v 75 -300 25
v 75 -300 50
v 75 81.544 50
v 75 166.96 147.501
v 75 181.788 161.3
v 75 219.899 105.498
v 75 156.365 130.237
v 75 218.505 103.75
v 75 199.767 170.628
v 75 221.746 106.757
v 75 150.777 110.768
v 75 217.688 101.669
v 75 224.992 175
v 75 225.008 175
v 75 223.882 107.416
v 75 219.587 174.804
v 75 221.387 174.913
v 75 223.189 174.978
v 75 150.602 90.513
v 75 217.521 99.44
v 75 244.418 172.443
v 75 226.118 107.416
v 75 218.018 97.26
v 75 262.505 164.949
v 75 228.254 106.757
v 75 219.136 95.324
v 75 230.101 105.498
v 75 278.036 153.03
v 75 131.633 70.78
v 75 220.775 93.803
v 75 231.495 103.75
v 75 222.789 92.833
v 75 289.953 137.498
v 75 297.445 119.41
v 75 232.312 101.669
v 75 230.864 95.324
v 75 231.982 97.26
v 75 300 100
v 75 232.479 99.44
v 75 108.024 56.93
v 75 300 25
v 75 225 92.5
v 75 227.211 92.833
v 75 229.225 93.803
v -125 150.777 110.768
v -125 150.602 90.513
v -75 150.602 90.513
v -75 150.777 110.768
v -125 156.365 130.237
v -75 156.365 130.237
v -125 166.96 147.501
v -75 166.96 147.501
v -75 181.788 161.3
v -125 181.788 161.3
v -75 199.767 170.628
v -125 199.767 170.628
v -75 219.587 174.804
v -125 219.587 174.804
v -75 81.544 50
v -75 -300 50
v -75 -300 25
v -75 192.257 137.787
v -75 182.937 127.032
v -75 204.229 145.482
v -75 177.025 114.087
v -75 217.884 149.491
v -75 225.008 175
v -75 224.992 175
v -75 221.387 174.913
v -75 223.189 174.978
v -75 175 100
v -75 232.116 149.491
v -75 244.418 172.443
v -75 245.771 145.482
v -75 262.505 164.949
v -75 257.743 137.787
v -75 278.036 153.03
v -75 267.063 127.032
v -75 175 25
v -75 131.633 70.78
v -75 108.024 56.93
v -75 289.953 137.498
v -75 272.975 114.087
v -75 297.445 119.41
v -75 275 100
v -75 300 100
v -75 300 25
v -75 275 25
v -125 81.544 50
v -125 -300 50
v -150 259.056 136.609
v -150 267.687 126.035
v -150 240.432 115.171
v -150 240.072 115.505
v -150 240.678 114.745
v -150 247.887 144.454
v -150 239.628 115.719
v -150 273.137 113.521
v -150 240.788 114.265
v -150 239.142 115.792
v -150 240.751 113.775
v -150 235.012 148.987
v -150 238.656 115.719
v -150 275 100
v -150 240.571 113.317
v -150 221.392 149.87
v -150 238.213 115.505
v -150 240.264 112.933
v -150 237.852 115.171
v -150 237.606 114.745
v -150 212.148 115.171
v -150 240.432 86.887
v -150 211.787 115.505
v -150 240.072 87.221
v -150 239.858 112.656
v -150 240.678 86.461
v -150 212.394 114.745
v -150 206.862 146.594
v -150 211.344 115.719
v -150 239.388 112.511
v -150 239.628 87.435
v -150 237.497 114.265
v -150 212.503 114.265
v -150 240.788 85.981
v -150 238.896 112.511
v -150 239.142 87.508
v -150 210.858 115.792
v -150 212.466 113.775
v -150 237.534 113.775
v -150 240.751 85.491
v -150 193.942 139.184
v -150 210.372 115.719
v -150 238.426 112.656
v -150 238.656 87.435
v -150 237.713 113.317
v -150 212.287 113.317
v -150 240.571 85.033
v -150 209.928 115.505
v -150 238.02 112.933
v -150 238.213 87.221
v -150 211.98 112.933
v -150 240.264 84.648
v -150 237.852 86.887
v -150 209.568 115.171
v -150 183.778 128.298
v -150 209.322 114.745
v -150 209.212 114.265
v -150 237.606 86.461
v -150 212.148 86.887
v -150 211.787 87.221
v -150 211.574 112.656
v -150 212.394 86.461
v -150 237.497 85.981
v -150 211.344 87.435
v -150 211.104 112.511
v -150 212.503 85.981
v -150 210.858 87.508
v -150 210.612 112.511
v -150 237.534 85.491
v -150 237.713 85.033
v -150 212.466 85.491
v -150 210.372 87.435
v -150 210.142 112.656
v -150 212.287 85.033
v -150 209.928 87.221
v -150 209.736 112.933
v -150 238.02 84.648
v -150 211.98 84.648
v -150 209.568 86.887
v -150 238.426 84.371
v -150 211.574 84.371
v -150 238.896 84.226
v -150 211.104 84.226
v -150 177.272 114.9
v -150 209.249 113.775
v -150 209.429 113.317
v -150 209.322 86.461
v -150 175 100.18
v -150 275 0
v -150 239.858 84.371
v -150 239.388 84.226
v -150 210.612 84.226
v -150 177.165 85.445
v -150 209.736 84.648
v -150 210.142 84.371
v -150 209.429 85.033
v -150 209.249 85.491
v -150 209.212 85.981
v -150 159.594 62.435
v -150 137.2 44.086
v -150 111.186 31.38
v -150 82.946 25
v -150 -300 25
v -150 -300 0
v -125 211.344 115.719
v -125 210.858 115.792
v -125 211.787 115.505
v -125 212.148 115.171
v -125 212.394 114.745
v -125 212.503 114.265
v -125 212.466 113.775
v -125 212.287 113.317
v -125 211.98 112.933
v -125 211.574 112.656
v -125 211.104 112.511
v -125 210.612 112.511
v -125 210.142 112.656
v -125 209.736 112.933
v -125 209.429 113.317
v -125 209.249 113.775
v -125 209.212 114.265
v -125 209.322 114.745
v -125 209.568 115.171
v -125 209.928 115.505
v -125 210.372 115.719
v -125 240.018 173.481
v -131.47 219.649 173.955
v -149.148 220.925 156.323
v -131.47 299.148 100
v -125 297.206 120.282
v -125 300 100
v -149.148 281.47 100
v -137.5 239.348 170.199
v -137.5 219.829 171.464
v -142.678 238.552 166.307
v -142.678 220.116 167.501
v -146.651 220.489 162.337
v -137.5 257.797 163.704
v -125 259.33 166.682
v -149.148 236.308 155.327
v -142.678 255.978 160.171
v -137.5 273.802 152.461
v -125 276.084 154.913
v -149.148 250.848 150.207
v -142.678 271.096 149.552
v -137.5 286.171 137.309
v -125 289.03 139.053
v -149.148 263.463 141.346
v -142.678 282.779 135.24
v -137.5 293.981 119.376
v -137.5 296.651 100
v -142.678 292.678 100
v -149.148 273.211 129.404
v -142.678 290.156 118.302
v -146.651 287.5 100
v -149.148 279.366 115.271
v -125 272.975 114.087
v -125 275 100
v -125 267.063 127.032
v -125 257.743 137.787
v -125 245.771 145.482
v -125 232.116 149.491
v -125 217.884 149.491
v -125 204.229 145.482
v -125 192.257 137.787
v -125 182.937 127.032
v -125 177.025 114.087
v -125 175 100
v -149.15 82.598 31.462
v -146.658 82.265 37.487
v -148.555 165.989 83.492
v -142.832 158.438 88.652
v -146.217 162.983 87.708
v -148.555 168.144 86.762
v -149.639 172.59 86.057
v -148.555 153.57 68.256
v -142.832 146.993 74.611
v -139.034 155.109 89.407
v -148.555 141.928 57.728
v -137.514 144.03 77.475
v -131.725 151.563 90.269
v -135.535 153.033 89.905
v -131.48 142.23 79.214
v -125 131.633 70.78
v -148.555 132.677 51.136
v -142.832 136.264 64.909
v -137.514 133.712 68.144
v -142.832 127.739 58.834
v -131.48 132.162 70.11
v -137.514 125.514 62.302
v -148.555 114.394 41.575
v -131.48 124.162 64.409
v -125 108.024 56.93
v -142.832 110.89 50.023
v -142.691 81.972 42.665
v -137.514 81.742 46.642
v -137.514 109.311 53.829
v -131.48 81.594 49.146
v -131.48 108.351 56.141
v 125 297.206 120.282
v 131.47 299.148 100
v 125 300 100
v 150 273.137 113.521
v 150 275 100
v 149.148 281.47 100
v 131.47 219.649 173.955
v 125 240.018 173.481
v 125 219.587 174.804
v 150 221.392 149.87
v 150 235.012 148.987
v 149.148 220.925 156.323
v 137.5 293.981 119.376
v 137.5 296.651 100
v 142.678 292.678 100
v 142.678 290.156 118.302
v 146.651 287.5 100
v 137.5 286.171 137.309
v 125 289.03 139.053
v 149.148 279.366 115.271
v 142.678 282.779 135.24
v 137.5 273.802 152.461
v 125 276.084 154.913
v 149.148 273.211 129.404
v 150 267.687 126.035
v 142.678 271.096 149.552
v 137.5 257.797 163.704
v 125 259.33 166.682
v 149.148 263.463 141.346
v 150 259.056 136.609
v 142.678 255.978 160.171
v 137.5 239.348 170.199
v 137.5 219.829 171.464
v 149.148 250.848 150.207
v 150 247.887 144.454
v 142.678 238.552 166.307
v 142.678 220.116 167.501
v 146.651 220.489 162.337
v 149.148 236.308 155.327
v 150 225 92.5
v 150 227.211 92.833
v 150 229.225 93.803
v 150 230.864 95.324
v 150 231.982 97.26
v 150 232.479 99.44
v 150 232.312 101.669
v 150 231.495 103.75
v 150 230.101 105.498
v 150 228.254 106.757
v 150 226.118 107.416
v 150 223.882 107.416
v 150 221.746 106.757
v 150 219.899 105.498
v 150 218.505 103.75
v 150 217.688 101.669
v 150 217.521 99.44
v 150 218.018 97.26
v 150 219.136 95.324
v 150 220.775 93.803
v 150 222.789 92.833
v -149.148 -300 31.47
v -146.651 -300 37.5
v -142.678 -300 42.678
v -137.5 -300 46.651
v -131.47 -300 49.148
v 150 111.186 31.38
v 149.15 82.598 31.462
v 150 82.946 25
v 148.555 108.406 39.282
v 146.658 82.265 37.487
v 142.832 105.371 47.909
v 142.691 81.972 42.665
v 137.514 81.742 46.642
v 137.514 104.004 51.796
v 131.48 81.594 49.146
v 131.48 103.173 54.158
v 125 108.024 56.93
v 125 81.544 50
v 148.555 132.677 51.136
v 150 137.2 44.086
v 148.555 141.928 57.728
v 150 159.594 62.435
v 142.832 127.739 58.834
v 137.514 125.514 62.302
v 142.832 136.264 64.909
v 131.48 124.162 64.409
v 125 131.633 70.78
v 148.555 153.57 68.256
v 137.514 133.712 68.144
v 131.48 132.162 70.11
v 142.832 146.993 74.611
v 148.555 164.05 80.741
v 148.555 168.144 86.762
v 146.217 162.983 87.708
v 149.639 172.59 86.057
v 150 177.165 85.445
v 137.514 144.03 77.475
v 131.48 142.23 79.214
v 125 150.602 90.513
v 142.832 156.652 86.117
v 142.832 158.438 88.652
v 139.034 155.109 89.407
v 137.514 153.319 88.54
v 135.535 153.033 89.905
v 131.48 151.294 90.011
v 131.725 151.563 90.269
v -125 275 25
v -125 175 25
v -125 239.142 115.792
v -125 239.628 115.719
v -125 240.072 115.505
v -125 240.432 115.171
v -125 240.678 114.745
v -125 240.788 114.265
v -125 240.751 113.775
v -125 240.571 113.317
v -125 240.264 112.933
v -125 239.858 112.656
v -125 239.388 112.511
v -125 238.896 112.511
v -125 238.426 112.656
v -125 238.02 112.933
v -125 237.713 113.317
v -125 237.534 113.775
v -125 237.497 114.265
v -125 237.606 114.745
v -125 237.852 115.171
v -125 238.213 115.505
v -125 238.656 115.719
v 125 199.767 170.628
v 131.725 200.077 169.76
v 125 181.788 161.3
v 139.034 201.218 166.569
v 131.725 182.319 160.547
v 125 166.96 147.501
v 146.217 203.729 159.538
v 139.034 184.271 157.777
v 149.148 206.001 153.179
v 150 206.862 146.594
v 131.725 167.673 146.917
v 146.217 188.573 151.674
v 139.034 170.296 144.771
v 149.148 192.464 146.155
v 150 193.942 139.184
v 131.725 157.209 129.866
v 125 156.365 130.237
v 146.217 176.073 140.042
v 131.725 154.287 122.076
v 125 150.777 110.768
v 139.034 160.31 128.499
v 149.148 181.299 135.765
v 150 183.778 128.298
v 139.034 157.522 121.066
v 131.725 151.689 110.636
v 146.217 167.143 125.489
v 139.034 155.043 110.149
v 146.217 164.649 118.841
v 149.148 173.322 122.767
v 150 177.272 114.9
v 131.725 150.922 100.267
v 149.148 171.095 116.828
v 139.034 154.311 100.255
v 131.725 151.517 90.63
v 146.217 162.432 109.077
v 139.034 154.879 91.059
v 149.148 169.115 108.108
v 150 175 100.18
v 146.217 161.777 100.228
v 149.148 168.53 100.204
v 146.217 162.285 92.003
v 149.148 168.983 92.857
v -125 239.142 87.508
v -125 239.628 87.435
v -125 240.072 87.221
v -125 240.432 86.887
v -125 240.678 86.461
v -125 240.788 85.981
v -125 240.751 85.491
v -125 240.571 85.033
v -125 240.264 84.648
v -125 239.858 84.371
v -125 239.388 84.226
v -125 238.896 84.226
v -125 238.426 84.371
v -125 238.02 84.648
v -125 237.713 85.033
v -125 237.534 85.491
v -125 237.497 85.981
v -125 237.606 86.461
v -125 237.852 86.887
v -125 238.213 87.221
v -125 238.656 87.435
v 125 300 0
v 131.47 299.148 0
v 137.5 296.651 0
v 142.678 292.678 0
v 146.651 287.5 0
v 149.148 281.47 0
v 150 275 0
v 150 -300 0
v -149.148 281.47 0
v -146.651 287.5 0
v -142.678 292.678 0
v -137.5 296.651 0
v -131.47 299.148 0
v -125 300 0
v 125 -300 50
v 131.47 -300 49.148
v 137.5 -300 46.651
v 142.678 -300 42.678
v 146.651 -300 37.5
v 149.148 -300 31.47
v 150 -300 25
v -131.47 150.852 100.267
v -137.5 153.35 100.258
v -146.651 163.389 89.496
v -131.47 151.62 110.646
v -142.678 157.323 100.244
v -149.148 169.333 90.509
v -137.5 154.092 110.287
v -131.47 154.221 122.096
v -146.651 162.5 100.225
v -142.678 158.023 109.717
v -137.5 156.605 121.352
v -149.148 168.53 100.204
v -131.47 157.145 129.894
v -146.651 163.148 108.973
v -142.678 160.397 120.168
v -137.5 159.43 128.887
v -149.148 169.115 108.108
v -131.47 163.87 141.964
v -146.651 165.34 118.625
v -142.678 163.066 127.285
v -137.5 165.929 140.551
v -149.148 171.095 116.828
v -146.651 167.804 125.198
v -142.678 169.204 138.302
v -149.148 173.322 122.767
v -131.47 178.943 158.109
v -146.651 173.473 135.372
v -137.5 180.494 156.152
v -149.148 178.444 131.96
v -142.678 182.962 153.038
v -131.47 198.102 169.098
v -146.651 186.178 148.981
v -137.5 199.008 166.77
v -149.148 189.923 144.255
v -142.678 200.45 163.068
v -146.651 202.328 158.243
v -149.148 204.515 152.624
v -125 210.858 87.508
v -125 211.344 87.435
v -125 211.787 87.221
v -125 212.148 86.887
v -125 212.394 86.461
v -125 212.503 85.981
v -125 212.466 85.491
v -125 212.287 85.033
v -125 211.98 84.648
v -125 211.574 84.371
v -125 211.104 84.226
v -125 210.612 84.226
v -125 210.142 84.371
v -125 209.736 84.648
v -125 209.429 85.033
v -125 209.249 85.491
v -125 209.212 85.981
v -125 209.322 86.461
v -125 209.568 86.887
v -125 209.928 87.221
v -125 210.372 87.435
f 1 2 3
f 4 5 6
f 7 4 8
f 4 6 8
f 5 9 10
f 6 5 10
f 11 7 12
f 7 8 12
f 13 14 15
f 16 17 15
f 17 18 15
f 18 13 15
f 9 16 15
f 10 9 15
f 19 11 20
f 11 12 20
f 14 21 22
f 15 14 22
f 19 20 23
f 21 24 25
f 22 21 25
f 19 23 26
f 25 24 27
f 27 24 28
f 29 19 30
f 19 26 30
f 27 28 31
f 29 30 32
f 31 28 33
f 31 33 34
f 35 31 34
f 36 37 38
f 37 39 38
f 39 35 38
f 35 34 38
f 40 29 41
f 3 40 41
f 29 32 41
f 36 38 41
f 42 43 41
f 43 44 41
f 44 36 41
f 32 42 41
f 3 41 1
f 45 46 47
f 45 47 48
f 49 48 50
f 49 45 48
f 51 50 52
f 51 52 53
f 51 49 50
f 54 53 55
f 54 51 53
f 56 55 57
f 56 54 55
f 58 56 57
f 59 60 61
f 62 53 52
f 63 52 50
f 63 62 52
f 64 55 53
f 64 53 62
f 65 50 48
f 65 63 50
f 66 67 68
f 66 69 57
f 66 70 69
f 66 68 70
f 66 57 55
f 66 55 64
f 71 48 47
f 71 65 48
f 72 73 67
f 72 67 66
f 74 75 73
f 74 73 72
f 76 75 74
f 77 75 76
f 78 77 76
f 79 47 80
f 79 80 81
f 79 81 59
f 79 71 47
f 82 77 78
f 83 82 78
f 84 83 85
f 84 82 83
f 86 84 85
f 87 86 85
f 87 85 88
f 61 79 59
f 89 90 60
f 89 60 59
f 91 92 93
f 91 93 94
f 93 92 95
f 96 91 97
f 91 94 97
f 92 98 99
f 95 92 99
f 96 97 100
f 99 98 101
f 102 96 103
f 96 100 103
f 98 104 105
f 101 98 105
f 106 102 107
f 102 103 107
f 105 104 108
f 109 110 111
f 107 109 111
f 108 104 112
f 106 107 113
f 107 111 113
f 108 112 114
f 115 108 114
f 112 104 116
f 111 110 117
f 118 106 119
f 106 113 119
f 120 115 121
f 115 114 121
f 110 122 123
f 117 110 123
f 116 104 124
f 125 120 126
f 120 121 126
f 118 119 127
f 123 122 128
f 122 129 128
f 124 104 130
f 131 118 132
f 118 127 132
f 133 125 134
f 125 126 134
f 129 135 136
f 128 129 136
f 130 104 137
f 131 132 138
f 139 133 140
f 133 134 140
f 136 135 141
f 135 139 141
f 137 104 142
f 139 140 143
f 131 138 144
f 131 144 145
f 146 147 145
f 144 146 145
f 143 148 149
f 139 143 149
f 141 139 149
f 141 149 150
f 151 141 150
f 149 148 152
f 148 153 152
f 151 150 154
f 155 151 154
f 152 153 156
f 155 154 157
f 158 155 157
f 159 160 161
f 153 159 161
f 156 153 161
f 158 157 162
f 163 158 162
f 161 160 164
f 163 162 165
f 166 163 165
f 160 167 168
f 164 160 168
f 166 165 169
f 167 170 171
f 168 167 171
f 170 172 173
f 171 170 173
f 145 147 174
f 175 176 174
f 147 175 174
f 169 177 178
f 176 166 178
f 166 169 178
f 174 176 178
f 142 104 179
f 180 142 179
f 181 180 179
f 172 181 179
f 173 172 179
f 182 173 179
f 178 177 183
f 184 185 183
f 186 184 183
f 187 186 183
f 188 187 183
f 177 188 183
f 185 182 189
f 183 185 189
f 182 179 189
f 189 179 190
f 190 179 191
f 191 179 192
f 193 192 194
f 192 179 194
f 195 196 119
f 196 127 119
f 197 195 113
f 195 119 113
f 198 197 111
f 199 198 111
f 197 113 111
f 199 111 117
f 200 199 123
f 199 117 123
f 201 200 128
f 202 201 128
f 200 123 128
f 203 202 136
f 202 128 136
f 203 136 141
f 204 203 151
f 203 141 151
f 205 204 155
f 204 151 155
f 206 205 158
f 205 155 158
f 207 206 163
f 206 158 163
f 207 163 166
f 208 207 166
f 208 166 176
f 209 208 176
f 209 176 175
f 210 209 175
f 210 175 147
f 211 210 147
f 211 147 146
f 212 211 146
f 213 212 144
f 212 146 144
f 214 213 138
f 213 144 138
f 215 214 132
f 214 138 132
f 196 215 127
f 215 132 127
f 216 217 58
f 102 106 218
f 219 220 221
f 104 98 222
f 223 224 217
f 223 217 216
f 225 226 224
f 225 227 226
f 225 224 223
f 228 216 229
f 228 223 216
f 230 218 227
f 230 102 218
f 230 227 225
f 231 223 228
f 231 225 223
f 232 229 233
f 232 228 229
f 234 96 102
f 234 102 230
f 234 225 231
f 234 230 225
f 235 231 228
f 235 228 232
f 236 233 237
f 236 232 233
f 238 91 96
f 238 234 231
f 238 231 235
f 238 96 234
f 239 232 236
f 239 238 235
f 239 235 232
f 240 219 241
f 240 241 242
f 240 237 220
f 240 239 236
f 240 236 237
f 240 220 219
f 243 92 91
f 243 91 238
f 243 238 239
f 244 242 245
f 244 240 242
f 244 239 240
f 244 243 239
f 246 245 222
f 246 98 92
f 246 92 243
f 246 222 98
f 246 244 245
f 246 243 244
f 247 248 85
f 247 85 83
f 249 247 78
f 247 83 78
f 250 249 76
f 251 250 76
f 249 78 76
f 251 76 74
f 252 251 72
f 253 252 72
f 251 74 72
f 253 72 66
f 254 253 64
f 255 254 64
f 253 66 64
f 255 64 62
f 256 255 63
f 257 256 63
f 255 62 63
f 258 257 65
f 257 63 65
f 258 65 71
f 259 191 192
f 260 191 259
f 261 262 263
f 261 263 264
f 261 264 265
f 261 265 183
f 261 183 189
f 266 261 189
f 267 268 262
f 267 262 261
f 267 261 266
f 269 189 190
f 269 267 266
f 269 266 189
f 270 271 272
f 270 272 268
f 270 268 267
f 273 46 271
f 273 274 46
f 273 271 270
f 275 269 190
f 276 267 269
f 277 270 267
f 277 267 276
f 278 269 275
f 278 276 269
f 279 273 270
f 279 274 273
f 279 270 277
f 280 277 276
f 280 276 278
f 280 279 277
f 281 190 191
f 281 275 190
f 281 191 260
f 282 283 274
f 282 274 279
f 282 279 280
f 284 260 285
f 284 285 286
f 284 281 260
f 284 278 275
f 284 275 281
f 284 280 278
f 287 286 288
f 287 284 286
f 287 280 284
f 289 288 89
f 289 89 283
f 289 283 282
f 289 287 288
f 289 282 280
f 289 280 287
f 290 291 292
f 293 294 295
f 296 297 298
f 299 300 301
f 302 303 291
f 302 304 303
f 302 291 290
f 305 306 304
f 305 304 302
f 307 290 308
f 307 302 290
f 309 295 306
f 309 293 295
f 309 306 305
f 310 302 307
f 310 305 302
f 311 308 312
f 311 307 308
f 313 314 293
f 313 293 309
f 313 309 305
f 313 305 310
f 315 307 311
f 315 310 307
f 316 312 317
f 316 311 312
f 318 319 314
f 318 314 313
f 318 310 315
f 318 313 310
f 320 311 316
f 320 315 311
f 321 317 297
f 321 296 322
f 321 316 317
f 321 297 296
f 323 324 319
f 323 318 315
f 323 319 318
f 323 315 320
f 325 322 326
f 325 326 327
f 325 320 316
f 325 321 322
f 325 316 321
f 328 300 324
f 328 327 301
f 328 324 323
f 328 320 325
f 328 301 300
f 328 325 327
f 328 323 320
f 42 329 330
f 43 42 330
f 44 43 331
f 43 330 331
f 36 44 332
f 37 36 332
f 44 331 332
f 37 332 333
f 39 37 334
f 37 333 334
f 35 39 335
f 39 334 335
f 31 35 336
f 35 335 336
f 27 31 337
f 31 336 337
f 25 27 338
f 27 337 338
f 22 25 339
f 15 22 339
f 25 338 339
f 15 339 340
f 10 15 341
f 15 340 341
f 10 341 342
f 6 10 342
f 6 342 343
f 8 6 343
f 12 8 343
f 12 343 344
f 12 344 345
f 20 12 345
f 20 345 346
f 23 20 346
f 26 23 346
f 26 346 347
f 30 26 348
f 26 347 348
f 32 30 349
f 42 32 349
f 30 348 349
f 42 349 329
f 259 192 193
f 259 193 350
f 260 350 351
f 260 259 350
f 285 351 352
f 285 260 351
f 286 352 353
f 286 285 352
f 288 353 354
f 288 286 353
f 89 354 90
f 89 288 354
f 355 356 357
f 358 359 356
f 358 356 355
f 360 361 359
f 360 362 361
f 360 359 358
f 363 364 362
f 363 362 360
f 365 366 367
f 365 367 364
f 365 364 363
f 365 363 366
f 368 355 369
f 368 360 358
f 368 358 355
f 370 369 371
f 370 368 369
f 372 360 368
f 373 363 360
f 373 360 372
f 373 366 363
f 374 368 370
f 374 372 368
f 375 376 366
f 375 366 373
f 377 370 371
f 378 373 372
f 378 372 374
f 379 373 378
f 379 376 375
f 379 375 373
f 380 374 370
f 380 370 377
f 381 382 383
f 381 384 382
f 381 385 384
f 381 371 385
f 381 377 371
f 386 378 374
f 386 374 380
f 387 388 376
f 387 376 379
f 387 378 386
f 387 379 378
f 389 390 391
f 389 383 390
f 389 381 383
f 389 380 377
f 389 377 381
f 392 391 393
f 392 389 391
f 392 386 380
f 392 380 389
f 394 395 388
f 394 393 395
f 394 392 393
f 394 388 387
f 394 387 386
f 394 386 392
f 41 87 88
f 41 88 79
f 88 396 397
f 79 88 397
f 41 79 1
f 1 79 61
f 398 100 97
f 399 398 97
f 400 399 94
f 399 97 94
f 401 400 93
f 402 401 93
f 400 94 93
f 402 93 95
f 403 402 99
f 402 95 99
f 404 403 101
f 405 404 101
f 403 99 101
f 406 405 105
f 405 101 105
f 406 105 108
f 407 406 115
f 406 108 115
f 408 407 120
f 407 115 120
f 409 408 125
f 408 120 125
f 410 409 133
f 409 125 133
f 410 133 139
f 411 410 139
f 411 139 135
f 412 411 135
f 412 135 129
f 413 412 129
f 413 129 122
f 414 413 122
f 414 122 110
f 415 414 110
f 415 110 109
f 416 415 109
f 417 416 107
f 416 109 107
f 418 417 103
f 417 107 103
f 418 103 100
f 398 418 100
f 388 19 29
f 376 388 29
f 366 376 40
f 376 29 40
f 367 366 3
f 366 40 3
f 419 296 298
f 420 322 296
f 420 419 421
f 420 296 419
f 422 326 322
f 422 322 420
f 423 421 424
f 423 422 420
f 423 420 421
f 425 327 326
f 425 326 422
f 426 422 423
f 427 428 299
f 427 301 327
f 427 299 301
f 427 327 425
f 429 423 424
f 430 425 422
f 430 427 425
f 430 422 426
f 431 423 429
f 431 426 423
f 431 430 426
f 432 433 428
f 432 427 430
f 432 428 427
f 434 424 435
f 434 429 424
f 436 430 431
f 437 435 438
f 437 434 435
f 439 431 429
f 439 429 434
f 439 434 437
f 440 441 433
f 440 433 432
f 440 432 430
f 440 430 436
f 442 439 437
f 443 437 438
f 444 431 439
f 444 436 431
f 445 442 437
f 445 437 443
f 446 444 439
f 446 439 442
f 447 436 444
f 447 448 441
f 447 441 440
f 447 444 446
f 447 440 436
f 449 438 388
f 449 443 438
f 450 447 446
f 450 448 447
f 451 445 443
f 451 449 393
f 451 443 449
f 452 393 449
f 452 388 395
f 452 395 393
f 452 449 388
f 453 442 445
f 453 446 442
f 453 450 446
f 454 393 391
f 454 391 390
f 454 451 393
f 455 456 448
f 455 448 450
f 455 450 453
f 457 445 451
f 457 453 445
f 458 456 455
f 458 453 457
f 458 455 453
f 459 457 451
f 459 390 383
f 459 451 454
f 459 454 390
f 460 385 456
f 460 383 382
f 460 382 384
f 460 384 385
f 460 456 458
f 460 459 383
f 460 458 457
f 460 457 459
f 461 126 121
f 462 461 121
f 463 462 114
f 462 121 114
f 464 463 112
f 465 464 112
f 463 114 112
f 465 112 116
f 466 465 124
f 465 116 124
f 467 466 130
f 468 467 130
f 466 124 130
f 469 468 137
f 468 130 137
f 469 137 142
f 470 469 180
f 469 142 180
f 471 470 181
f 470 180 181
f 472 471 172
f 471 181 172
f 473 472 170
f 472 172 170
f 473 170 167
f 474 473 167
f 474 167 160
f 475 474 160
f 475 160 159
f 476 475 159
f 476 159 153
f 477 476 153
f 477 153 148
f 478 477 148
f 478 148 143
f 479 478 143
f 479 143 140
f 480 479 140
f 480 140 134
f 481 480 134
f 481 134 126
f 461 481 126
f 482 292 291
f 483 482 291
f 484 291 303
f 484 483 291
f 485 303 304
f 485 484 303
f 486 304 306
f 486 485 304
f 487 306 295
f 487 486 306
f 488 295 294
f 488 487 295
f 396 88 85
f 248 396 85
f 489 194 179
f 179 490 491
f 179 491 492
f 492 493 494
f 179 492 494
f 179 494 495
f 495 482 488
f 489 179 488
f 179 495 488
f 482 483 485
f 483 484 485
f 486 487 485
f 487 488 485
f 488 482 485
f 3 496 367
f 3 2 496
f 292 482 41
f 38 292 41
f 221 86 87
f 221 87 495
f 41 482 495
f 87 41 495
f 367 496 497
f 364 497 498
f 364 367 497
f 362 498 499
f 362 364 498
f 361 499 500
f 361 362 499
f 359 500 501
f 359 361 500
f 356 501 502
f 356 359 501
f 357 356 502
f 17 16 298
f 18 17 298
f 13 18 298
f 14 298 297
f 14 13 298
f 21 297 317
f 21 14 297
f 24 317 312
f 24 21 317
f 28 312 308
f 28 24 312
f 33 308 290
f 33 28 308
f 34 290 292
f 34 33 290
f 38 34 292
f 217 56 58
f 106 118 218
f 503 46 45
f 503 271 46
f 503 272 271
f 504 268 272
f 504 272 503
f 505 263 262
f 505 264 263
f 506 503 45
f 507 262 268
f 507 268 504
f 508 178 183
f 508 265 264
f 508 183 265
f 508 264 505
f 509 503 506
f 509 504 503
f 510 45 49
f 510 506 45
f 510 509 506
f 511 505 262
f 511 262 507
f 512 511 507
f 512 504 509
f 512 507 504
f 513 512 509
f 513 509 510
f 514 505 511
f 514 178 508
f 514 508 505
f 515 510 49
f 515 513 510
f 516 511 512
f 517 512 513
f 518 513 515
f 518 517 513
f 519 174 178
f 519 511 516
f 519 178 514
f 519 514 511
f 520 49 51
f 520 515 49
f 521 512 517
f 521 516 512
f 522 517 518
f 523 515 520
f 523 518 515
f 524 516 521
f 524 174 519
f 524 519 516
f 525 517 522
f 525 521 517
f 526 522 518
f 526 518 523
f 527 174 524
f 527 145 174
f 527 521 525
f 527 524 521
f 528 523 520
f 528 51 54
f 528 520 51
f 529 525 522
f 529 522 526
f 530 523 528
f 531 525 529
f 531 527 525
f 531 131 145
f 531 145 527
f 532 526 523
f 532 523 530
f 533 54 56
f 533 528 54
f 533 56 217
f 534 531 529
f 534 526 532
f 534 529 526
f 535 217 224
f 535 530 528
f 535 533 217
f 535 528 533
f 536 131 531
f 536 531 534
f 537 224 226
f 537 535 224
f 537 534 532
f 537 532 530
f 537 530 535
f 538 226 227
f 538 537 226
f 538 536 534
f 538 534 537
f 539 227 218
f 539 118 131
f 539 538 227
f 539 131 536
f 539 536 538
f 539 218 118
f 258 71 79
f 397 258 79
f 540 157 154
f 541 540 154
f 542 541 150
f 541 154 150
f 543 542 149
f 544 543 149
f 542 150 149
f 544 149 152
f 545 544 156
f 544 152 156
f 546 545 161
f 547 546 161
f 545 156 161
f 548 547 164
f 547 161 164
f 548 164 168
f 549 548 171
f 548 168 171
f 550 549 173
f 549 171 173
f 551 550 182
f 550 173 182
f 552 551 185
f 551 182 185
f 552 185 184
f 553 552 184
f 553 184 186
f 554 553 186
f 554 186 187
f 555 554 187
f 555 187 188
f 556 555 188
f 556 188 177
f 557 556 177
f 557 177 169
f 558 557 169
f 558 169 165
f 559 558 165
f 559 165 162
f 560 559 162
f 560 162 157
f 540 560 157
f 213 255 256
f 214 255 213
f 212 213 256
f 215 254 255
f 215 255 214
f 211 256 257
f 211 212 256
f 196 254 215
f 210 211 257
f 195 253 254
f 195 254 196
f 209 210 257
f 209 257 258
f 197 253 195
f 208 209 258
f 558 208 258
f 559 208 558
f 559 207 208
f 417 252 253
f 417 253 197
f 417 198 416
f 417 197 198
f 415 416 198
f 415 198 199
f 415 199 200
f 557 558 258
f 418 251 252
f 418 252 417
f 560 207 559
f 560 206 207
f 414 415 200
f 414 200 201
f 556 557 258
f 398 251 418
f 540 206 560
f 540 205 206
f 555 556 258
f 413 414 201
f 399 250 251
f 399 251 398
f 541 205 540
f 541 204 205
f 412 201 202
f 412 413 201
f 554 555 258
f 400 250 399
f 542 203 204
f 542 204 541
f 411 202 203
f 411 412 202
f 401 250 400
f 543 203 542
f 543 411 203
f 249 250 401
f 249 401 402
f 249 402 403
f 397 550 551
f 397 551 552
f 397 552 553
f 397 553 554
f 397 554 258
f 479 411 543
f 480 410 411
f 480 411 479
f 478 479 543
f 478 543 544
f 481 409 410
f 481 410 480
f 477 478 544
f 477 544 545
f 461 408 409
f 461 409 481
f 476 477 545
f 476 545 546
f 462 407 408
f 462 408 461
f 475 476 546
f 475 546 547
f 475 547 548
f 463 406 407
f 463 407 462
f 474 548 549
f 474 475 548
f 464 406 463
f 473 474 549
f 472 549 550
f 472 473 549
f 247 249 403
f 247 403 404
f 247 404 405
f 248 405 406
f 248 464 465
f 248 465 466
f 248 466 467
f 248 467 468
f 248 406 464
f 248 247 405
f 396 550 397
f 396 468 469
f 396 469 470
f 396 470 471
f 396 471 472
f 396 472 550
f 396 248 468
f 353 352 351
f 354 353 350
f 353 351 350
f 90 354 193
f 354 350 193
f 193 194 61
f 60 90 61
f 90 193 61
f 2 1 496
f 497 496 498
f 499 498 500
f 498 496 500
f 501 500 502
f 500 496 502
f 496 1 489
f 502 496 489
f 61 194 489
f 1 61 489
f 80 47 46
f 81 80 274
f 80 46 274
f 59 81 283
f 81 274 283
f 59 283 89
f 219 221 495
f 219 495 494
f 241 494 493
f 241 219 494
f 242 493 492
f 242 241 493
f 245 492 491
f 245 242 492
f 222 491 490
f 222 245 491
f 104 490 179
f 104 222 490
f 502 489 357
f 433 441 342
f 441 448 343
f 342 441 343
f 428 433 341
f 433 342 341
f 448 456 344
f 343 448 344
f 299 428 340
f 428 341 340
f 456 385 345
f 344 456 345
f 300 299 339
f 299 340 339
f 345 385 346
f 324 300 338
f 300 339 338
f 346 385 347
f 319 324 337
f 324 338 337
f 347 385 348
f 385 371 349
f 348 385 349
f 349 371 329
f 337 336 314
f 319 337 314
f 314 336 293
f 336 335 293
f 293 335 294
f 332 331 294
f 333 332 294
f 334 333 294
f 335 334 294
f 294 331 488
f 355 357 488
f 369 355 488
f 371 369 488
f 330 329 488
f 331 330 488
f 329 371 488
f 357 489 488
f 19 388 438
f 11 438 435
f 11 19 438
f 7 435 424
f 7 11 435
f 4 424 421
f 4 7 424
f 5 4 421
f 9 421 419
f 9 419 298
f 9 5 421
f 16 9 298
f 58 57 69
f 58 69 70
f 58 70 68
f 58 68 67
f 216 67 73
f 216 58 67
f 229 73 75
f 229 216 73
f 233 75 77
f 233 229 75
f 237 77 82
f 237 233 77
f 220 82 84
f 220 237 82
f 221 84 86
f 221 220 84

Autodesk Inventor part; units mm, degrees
ref_plane "YZ Plane" through (0, 0, 0) normal (1, 0, 0) x (0, 1, 0)
ref_plane "XZ Plane" through (0, 0, 0) normal (0, 1, 0) x (-1, 0, 0)
sketch "Sketch1" plane through (0, 0, 0) normal (0, 0, 1) x (1, 0, 0)
  line L0 (-150, -300) -> (150, -300)
  line L1 (150, -300) -> (150, 300)
  line L2 (150, 300) -> (-150, 300)
  line L3 (-150, 300) -> (-150, -300)
  line L4 (-150, -300) -> (150, 300) construction
  line L5 (150, -300) -> (-150, 300) construction
  point P0 (0, 0)
  point P1 (0, 0)
  dimension "d23" = 300
  dimension "d24" = 600
sketch "Sketch1 outline for Extrusion1" plane through (0, 0, 0) normal (0, 0, 1) x (1, 0, 0)
  line L0 (-150, 300) -> (-150, -300)
  line L1 (150, 300) -> (-150, 300)
  line L2 (150, -300) -> (150, 300)
  line L3 (-150, -300) -> (150, -300)
extrude "Extrusion1" add sketch "Sketch1 outline for Extrusion1" along normal blind 25
sketch "Sketch15" plane through (-150, -300, 0) normal (-1, 0, 0) x (0, 0, 1)
  line L0 (0, 0) -> (0, 600) construction
  line L1 (0, 600) -> (300, 600) construction
  line L2 (0, 600) -> (300, 600) construction
  line L3 (25, 600) -> (25, 0) construction
  line L4 (0, 600) -> (25, 600)
  line L5 (25, 600) -> (100, 600)
  line L6 (25, 381.543819) -> (50, 381.543819) construction
  line L7 (25, 0) -> (50, 0)
  line L8 (50, 0) -> (50, 381.543819)
  arc A0 (174.804436, 519.587383) -> (100, 600) centre (100, 525) ccw
  arc A1 (90.513255, 450.602408) -> (174.804436, 519.587383) centre (100, 525) ccw
  arc A2 (90.513255, 450.602408) -> (50, 381.543819) centre (149.296649, 369.704246) ccw
  line L9 (25, 0) -> (25, 600)
  line L10 (25, 0) -> (25, 600)
  point P0 (0, 300)
  dimension "d54" = 300
  dimension "d55" = 0
  dimension "d59" = 25
  dimension "d60" = 25
  dimension "d61" = 75
  dimension "d62" = 75
  dimension "d63" = 75
  dimension "d65" = 100
  dimension "d79" = 124.29665
sketch "Sketch15 outline for Extrusion14" plane through (-150, -300, 0) normal (-1, 0, 0) x (0, 0, 1)
  line L0 (100, 600) -> (25, 600)
  arc A0 (174.804436, 519.587383) -> (100, 600) centre (100, 525) ccw
  arc A1 (90.513255, 450.602408) -> (174.804436, 519.587383) centre (100, 525) ccw
  arc A2 (50, 381.543819) -> (90.513255, 450.602408) centre (149.296649, 369.704246) cw
  line L1 (50, 0) -> (50, 381.543819)
  line L2 (25, 0) -> (50, 0)
  line L3 (25, 600) -> (25, 0)
extrude "Extrusion14" add sketch "Sketch15 outline for Extrusion14" against normal blind 300
ref_plane "Work Plane1" through (0, -300, 0) normal (1, 0, 0) x (0, 0, -1)
sketch "Sketch16" plane through (0, -300, 0) normal (1, 0, 0) x (0, 0, -1)
  line L0 (-175, 600) -> (-25, 600)
  line L1 (-25, 600) -> (-25, 0)
  line L2 (-25, 0) -> (-175, 0)
  line L3 (-175, 0) -> (-175, 600)
  point P0 (0, 300)
  dimension "d73" = 150
  dimension "d74" = 600
  dimension "d75" = 25
  dimension "d76" = 300
sketch "Sketch16 outline for Extrusion16" plane through (0, -300, 0) normal (1, 0, 0) x (0, 0, -1)
  line L0 (-175, 600) -> (-25, 600)
  line L1 (-25, 600) -> (-25, 0)
  line L2 (-25, 0) -> (-175, 0)
  line L3 (-175, 0) -> (-175, 600)
extrude "Extrusion16" cut sketch "Sketch16 outline for Extrusion16" along normal mid plane 150
sketch "Sketch17" plane through (-75, -300, 0) normal (1, 0, 0) x (0, 0, -1)
  arc A0 (-100, 600) -> (-90.513255, 450.602408) centre (-100, 525) ccw
  line L0 (-100, 475) -> (-25, 475)
  line L1 (-25, 475) -> (-25, 575)
  line L2 (-25, 575) -> (-100, 575)
  arc A1 (-100, 575) -> (-100, 475) centre (-100, 525) ccw
  line L3 (0, 600) -> (0, 0)
  point P0 (0, 300)
  dimension "d86" = 50
  dimension "d87" = 25
  dimension "d88" = 90
sketch "Sketch17 outline for Extrusion17" plane through (-75, -300, 0) normal (1, 0, 0) x (0, 0, -1)
  arc A0 (-100, 575) -> (-100, 475) centre (-100, 525) ccw
  line L0 (-25, 575) -> (-100, 575)
  line L1 (-25, 475) -> (-25, 575)
  line L2 (-100, 475) -> (-25, 475)
extrude "Extrusion17" cut sketch "Sketch17 outline for Extrusion17" against normal blind 50
sketch "Sketch21" plane through (-150, -300, 0) normal (-1, 0, 0) x (0, 0, 1)
  arc A0 (90.513255, 450.602408) -> (100, 600) centre (100, 525) ccw
  line L0 (85.857864, 510.857864) -> (114.142136, 510.857864) construction
  line L1 (114.142136, 510.857864) -> (114.142136, 539.142136) construction
  line L2 (114.142136, 539.142136) -> (85.857864, 539.142136) construction
  line L3 (85.857864, 539.142136) -> (85.857864, 510.857864) construction
  line L4 (114.142136, 510.857864) -> (85.857864, 539.142136) construction
  circle A1 centre (114.142136, 539.142136) radius 1.65
  circle A2 centre (85.857864, 539.142136) radius 1.65
  circle A3 centre (114.142136, 510.857864) radius 1.65
  circle A4 centre (85.857864, 510.857864) radius 1.65
  line L5 (85.857864, 510.857864) -> (114.142136, 539.142136) construction
  line L6 (0, 600) -> (0, 0) construction
  line L7 (0, 600) -> (100, 600)
  point P0 (0, 300)
  dimension "d102" = 28.28427
  dimension "d103" = 28.28427
  dimension "d104" = 3.3
  dimension "d105" = 3.3
  dimension "d106" = 3.3
  dimension "d107" = 3.3
  dimension "d111" = 85.85786
  dimension "d112" = 60.85786
sketch "Sketch21 outline for Extrusion21" plane through (-150, -300, 0) normal (-1, 0, 0) x (0, 0, 1)
  circle A0 centre (114.142136, 539.142136) radius 1.65
  circle A1 centre (85.857864, 539.142136) radius 1.65
  circle A2 centre (114.142136, 510.857864) radius 1.65
  circle A3 centre (85.857864, 510.857864) radius 1.65
extrude "Extrusion21" cut sketch "Sketch21 outline for Extrusion21" against normal blind 75
sketch "Sketch22" plane through (150, -300, 0) normal (1, 0, 0) x (0, 0, -1)
  circle A0 centre (-100, 525) radius 7.5
  arc A1 (-100, 600) -> (-90.513255, 450.602408) centre (-100, 525) ccw
  point P0 (0, 300)
  dimension "d113" = 15
sketch "Sketch22 outline for Extrusion22" plane through (150, -300, 0) normal (1, 0, 0) x (0, 0, -1)
  circle A0 centre (-100, 525) radius 7.5
extrude "Extrusion22" cut sketch "Sketch22 outline for Extrusion22" against normal blind 75
fillet "Fillet3" radius 25 8 edges at (-150, 300, 50) (-150, 220.2471, 174.8492) (-150, 120.3047, 63.0435) (-150, -109.2281, 50) (150, 300, 50) (150, 220.2471, 174.8492) (150, 120.3047, 63.0435) (150, -109.2281, 50)
properties material "ABS Plastic"
